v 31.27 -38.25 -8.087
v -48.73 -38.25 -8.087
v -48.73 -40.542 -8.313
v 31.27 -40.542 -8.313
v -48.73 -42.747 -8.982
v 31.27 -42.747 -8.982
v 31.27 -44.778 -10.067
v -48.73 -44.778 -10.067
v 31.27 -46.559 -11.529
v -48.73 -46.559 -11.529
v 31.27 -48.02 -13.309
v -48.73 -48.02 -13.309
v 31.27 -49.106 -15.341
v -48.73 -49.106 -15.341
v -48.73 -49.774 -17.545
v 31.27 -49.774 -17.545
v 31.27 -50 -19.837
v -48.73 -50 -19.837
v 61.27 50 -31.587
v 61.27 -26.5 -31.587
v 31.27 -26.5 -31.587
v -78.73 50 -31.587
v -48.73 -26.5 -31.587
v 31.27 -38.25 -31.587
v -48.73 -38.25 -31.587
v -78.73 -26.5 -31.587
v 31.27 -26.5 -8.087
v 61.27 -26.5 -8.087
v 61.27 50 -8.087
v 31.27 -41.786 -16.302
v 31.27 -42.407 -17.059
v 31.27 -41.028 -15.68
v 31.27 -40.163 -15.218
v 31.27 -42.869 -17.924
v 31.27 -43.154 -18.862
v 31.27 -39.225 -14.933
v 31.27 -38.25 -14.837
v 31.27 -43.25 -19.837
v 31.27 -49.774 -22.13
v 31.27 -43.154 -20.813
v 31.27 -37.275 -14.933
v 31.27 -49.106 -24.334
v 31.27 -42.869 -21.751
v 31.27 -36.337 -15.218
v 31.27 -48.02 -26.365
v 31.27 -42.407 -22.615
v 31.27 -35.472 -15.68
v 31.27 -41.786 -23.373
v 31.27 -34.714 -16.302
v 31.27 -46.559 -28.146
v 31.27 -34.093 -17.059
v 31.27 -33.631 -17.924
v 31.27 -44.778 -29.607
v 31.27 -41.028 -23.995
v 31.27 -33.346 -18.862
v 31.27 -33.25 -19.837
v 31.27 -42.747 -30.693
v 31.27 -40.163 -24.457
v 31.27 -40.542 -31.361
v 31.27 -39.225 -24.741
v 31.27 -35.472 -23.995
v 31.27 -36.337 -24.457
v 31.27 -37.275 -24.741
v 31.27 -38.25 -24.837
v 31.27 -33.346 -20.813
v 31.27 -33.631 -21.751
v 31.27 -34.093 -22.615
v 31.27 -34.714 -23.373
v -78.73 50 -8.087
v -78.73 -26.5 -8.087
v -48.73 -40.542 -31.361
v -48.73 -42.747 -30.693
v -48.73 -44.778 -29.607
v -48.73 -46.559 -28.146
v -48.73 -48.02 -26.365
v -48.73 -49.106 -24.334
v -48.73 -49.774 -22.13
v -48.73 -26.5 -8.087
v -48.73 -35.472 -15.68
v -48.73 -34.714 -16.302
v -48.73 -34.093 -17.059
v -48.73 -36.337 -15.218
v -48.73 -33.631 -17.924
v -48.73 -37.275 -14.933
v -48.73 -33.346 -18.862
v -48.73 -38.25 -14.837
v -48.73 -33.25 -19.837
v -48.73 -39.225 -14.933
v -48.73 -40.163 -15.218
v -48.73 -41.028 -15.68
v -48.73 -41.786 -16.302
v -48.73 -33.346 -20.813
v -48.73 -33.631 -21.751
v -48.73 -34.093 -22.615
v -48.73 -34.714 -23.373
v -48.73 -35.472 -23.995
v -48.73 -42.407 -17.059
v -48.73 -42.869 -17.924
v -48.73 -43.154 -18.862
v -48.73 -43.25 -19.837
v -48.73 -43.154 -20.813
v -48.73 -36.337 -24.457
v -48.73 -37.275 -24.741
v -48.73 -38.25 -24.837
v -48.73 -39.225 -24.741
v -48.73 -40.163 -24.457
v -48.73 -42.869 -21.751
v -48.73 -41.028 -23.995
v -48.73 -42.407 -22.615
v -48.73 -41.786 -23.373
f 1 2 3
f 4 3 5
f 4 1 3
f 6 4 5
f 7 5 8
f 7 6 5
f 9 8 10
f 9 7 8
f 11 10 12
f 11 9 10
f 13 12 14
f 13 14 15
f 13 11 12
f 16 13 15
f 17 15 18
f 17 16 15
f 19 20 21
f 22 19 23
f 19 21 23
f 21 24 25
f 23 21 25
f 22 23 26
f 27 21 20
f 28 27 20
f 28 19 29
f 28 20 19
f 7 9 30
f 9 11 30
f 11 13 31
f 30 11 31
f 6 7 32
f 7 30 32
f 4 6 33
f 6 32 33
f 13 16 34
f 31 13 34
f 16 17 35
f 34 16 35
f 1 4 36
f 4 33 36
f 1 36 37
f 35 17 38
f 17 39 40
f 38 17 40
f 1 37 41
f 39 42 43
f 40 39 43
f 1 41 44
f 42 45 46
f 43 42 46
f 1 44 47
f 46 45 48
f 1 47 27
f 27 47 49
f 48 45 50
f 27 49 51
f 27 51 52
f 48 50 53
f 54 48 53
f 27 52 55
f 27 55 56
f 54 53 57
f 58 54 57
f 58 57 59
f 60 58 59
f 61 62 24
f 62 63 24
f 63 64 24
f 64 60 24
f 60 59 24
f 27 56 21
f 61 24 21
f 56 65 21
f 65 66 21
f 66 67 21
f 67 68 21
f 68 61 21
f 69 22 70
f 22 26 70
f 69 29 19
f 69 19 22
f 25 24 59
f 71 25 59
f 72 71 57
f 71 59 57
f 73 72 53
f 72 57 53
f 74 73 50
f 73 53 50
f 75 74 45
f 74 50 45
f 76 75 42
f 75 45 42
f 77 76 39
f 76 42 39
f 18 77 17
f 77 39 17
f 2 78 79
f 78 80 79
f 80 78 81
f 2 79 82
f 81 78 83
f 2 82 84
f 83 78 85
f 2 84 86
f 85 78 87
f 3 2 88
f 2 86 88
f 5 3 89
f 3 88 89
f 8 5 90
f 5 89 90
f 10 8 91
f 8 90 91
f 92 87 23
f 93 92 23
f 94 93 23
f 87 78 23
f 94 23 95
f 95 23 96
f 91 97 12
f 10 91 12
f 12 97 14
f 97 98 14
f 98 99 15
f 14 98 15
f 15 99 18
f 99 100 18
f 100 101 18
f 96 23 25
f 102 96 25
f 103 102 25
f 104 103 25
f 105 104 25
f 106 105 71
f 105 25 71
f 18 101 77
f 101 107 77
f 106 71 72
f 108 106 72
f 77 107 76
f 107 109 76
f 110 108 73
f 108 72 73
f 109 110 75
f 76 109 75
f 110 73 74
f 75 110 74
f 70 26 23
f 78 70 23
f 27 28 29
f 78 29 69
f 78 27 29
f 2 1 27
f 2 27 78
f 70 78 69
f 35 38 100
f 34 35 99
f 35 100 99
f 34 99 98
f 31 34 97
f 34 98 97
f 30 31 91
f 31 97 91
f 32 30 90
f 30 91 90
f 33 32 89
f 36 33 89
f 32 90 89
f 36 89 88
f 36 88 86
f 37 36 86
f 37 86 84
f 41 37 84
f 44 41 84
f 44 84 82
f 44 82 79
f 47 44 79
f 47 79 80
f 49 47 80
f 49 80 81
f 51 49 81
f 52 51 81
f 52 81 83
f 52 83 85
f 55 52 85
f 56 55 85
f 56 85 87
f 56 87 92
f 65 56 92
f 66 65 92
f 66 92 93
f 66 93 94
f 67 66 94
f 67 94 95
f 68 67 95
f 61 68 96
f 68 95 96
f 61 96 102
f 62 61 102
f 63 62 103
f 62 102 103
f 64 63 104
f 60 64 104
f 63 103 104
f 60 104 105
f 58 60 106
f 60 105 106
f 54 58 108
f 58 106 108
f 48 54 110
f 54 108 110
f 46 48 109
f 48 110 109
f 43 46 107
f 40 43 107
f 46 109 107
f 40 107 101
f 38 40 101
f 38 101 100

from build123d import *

# Parameters (mm, degrees)
F0_W     = 140
F0_H     = 23.5
F1_DEPTH = 50
F2_R     = 11.74999
F3_R     = 5
F4_DEPTH = 140
F6_DEPTH = 25
F7_W     = 140
F7_H     = 23.5
F8_DEPTH = 50


# Not quite as in the source:
# - a fillet or chamfer is up to 0.001 mm smaller than in the source, because OpenCascade refuses the exact size


with BuildPart() as f1:
    # F0 (on Front) → F1 (new body)
    with BuildSketch(Plane.XZ):
        with Locations((-8.7296748534, -19.8372076215)):
            Rectangle(F0_W, F0_H)
    extrude(amount=F1_DEPTH)

    # F2 (radius 11.75 in the source; OpenCascade refuses exactly that, so slightly less here)
    f2_edges = [f1.edges().sort_by_distance(p)[0] for p in [
        (-8.729675, -50, -8.087208),
        (-8.729675, -50, -31.587208),
    ]]
    fillet(f2_edges, radius=F2_R)

    # F3 (on face) → F4 (cut, through all)
    with BuildSketch(Plane(origin=(-78.7296748534, 0, 0), x_dir=(0, -1, 0), z_dir=(-1, 0, 0))):
        with Locations((38.25, -19.8372076215)):
            Circle(F3_R)
    extrude(amount=-F4_DEPTH, mode=Mode.SUBTRACT)

    # F5 (on face) → F6 (cut)
    with BuildSketch(Plane(origin=(0, 0, -31.5872076215), x_dir=(1, 0, 0), z_dir=(0, 0, -1))):
        Polygon((-48.7296748534, 26.5), (-48.7296748534, 51.5), (-48.7296748534, 66.3150921464), (-82.7311202884, 66.3150921464), (-82.7311202884, 26.5), (-78.7296748534, 26.5), align=None)
        Polygon((31.2703251466, 61.9400218129), (31.2703251466, 51.5), (31.2703251466, 26.5), (74.6265202761, 26.5), (74.6265202761, 61.9400218129), align=None)
    extrude(amount=-F6_DEPTH, mode=Mode.SUBTRACT)

    # F7 (on face) → F8 (join)
    with BuildSketch(Plane(origin=(0, 0, 0), x_dir=(-1, 0, 0), z_dir=(0, 1, 0))):
        with Locations((8.7296748534, -19.8372076215)):
            Rectangle(F7_W, F7_H)
    extrude(amount=F8_DEPTH)


solid = f1.part
